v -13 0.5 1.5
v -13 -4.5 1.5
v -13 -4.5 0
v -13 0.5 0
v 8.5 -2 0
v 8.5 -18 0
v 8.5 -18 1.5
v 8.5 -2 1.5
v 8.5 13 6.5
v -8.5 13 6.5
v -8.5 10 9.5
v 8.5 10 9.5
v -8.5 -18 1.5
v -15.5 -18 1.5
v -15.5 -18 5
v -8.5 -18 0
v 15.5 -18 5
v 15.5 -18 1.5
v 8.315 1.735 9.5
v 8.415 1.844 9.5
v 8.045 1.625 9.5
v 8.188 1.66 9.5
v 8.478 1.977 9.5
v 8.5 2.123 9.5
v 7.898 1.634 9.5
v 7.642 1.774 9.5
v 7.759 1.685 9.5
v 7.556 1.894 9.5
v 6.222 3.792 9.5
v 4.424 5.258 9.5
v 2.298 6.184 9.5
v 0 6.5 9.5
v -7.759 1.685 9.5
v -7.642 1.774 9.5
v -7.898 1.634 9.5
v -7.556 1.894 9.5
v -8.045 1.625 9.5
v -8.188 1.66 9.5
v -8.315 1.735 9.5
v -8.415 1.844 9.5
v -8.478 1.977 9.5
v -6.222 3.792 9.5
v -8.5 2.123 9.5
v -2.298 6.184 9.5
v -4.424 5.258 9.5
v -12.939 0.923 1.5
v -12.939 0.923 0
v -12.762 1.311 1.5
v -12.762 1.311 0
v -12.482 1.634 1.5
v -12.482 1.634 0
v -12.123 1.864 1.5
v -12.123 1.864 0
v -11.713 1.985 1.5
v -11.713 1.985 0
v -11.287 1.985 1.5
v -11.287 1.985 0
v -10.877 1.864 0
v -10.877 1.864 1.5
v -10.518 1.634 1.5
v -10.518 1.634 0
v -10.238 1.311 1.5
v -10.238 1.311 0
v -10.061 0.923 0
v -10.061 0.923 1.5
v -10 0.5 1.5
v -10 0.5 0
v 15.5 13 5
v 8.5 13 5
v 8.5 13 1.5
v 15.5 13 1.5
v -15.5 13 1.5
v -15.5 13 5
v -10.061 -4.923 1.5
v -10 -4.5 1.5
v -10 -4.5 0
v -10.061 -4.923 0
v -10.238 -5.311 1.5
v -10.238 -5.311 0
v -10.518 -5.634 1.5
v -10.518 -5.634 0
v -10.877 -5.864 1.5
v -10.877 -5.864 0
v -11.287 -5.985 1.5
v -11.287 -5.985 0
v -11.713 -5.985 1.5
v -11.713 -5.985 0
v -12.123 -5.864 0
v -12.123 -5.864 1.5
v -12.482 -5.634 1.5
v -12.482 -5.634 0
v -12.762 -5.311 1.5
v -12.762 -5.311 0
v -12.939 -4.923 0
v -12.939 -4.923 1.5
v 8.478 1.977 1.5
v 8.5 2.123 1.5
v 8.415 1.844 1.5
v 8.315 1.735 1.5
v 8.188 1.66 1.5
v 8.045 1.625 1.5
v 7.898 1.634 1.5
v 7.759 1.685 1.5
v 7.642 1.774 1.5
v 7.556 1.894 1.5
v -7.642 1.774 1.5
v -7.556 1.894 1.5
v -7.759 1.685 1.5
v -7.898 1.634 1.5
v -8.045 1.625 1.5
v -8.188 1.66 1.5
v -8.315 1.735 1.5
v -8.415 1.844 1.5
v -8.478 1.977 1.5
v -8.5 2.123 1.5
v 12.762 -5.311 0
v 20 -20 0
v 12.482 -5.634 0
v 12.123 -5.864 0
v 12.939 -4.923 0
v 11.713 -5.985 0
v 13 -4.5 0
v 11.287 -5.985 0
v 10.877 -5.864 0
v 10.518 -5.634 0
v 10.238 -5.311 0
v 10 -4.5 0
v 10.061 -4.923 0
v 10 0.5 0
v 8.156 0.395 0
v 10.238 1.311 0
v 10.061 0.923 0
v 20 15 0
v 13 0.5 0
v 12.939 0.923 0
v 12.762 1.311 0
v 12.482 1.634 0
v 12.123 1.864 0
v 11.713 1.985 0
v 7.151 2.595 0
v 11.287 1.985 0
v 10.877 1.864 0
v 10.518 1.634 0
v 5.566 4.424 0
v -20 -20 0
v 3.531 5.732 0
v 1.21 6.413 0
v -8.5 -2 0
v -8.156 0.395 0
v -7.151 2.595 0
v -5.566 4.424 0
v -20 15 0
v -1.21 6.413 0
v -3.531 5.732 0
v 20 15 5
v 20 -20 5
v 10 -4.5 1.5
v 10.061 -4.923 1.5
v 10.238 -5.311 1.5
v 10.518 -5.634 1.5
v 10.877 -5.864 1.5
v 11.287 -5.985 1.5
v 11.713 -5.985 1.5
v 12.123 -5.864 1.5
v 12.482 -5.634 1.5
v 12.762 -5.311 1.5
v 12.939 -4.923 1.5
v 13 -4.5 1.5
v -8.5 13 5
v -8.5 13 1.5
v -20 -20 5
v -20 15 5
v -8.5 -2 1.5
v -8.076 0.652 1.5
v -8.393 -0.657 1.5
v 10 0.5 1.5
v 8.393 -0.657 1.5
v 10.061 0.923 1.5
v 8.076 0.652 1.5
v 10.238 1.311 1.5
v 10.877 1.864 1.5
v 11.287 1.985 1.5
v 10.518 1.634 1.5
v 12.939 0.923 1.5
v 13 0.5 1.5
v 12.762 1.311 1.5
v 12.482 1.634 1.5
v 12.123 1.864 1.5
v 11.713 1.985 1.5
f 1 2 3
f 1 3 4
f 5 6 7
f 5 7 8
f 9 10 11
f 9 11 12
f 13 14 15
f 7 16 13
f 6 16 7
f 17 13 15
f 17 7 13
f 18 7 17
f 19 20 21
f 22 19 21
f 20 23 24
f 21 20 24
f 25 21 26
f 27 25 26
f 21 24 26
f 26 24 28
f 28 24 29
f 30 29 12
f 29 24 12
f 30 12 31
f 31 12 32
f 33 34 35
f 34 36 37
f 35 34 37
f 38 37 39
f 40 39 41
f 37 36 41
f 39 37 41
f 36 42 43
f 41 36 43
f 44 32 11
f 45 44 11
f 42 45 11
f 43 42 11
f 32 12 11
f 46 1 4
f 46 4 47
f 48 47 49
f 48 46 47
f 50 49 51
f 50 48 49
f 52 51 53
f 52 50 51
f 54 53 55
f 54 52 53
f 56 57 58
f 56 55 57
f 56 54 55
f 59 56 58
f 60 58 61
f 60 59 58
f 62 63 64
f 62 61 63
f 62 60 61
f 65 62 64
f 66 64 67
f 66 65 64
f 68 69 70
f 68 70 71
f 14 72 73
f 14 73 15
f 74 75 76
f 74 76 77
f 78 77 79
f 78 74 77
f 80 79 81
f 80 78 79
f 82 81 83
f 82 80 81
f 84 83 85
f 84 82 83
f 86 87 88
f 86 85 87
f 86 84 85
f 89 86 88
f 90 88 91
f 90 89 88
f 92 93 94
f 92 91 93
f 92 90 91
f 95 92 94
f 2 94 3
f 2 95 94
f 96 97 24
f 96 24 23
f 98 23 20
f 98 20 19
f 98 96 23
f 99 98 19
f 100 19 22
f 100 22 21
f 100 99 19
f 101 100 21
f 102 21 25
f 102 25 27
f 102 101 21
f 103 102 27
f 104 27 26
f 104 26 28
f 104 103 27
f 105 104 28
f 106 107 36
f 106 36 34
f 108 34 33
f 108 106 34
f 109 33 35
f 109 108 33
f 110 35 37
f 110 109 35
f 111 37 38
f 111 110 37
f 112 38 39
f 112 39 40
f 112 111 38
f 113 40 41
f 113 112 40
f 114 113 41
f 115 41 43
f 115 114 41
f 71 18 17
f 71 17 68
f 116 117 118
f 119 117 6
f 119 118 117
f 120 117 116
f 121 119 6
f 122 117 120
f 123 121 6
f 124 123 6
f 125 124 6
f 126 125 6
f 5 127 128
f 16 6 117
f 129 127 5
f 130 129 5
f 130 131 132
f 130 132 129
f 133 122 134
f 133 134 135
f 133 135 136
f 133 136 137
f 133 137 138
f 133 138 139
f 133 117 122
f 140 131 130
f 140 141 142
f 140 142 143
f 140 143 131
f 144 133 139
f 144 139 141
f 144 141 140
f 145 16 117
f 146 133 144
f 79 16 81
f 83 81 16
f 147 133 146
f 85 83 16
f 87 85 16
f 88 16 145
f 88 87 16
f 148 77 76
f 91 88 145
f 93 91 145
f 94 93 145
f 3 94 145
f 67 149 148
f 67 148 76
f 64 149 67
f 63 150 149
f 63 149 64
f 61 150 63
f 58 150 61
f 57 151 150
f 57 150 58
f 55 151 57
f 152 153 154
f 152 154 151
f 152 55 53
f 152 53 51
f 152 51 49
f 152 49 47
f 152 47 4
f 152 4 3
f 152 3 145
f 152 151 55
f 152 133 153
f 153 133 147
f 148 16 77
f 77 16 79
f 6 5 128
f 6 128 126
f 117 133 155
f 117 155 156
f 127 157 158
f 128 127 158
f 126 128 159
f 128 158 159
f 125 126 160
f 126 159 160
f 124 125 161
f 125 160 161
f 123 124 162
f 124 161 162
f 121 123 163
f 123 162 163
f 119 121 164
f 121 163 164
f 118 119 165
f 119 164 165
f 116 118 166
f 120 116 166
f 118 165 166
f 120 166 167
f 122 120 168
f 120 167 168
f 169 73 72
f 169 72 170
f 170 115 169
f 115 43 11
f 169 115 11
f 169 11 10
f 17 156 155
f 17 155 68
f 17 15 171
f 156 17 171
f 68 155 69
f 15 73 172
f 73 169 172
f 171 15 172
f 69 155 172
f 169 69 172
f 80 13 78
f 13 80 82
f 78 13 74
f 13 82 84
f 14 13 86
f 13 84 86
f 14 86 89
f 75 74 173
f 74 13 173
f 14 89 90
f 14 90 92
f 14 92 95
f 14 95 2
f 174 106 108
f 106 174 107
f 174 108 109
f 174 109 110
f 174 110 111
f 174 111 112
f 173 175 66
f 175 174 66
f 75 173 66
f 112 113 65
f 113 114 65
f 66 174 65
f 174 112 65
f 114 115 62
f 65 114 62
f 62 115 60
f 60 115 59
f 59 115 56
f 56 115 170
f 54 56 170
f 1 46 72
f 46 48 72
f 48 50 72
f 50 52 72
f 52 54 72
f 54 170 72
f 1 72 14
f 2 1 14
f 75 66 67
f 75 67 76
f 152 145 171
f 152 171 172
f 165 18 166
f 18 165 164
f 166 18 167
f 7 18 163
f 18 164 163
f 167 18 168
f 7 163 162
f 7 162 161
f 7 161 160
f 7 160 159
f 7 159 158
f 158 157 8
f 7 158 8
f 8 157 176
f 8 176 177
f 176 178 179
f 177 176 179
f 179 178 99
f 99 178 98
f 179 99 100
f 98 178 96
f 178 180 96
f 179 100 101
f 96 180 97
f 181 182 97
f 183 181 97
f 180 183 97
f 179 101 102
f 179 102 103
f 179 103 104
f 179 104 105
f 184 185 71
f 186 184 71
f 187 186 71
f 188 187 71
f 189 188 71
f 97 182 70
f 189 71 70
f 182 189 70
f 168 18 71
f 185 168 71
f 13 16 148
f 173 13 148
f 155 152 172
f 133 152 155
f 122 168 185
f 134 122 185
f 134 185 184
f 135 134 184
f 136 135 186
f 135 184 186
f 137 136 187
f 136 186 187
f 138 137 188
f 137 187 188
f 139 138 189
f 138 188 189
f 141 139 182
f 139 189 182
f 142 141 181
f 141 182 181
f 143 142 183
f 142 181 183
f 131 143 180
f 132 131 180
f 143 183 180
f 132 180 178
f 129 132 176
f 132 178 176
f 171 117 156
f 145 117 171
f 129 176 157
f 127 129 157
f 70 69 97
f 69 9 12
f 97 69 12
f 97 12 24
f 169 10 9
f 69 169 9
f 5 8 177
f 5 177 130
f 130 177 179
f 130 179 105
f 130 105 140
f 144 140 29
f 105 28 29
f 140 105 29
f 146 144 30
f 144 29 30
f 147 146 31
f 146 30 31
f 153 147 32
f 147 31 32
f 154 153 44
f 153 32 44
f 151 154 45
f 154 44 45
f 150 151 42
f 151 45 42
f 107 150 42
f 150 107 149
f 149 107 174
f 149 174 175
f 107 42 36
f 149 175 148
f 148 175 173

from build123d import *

# Parameters (mm, degrees)
SKETCH_1_W          = 40
SKETCH_1_H          = 30
EXTRUDE_1_DEPTH     = 5
SKETCH_2_W          = 31
SKETCH_2_H          = 28
CUT_EXTRUDE_1_DEPTH = 3.5
CUT_EXTRUDE_2_DEPTH = 26.243811123
EXTRUDE_START       = 8
EXTRUDE_2_DEPTH     = 8
FILLET_START        = 1.5
FILLET_1_DEPTH      = 8.5
CHAMFER_1_SIZE      = 3
EXTRUDE_3_DEPTH     = 5
SKETCH_7_W          = 7
SKETCH_7_H          = 3
EXTRUDE_4_DEPTH     = 1.5


with BuildPart() as part:
    # ｽｹｯﾁ1 → ﾎﾞｽ - 押し出し1 (new body)
    with BuildSketch(Plane.XY):
        Rectangle(SKETCH_1_W, SKETCH_1_H)
    extrude(amount=EXTRUDE_1_DEPTH)

    # ｽｹｯﾁ2 → ｶｯﾄ - 押し出し1 (cut)
    with BuildSketch(Plane.XY.offset(5)):
        with Locations((0, -1)):
            Rectangle(SKETCH_2_W, SKETCH_2_H)
    extrude(amount=-CUT_EXTRUDE_1_DEPTH, mode=Mode.SUBTRACT)

    # ｽｹｯﾁ3 → ｶｯﾄ - 押し出し2 (cut, through all)
    with BuildSketch(Plane.XY.offset(1.5)):
        with BuildLine():
            Line((8.5, -2), (8.5, -15))
            Line((8.5, -15), (-8.5, -15))
            Line((-8.5, -15), (-8.5, -2))
            ThreePointArc((-8.5, -2), (0, 6.5), (8.5, -2))
        make_face()
        with BuildLine():
            Line((13, -4.5), (13, 0.5))
            ThreePointArc((13, 0.5), (11.5, 2), (10, 0.5))
            Line((10, 0.5), (10, -4.5))
            ThreePointArc((10, -4.5), (11.5, -6), (13, -4.5))
        make_face()
        with BuildLine():
            Line((-13, -4.5), (-13, 0.5))
            ThreePointArc((-13, 0.5), (-11.5, 2), (-10, 0.5))
            Line((-10, 0.5), (-10, -4.5))
            ThreePointArc((-10, -4.5), (-11.5, -6), (-13, -4.5))
        make_face()
    extrude(amount=-CUT_EXTRUDE_2_DEPTH, mode=Mode.SUBTRACT)

    # ｽｹｯﾁ4 → ﾎﾞｽ - 押し出し2 (add)
    with BuildSketch(Plane.XY.offset(1.5).offset(EXTRUDE_START)):
        with BuildLine():
            Line((-8.5, -2), (-8.5, 13))
            Line((-8.5, 13), (8.5, 13))
            Line((8.5, 13), (8.5, -2))
            ThreePointArc((8.5, -2), (0, 6.5), (-8.5, -2))
        make_face()
    extrude(amount=-EXTRUDE_2_DEPTH)

    # ﾌｨﾚｯﾄ1: read off the stored shape, not the designer's step
    # ﾌｨﾚｯﾄ1 outline → ﾌｨﾚｯﾄ1 (cut)
    with BuildSketch(Plane.XY.offset(FILLET_START)):
        with BuildLine():
            ThreePointArc((8.5, 2.123105626), (8.117851131, 1.637192968), (7.555555556, 1.894044202))
            ThreePointArc((7.555555556, 1.894044202), (8.260515184, 0.003469213), (8.5, -2))
            Line((8.5, -2), (8.5, 2.123105626))
        make_face()
        with BuildLine():
            ThreePointArc((-7.555555556, 1.894044202), (-8.117851131, 1.637192968), (-8.5, 2.123105626))
            Line((-8.5, 2.123105626), (-8.5, -2))
            ThreePointArc((-8.5, -2), (-8.260515184, 0.003469213), (-7.555555556, 1.894044202))
        make_face()
    extrude(amount=FILLET_1_DEPTH, mode=Mode.SUBTRACT)

    # 面取り1
    chamfer_1_edges = [part.edges().sort_by_distance(p)[0] for p in [
        (0, 13, 9.5),
    ]]
    chamfer(chamfer_1_edges, length=CHAMFER_1_SIZE)

    # ｽｹｯﾁ5 → ﾎﾞｽ - 押し出し3 (add)
    with BuildSketch(Plane(origin=(0, 0, 0), x_dir=(-1, 0, 0), z_dir=(0, 0, -1))):
        Polygon((-15.5, -15), (-20, -15), (-20, -20), (20, -20), (20, -15), (15.5, -15), (15.5, -18), (8.5, -18), (-8.5, -18), (-15.5, -18), align=None)
    extrude(amount=-EXTRUDE_3_DEPTH)

    # ｽｹｯﾁ7 → ﾎﾞｽ - 押し出し4 (add)
    with BuildSketch(Plane(origin=(0, 0, 0), x_dir=(-1, 0, 0), z_dir=(0, 0, -1))):
        with Locations((12, -16.5)):
            Rectangle(SKETCH_7_W, SKETCH_7_H)
        with Locations((-12, -16.5)):
            Rectangle(SKETCH_7_W, SKETCH_7_H)
    extrude(amount=-EXTRUDE_4_DEPTH)


solid = part.part
